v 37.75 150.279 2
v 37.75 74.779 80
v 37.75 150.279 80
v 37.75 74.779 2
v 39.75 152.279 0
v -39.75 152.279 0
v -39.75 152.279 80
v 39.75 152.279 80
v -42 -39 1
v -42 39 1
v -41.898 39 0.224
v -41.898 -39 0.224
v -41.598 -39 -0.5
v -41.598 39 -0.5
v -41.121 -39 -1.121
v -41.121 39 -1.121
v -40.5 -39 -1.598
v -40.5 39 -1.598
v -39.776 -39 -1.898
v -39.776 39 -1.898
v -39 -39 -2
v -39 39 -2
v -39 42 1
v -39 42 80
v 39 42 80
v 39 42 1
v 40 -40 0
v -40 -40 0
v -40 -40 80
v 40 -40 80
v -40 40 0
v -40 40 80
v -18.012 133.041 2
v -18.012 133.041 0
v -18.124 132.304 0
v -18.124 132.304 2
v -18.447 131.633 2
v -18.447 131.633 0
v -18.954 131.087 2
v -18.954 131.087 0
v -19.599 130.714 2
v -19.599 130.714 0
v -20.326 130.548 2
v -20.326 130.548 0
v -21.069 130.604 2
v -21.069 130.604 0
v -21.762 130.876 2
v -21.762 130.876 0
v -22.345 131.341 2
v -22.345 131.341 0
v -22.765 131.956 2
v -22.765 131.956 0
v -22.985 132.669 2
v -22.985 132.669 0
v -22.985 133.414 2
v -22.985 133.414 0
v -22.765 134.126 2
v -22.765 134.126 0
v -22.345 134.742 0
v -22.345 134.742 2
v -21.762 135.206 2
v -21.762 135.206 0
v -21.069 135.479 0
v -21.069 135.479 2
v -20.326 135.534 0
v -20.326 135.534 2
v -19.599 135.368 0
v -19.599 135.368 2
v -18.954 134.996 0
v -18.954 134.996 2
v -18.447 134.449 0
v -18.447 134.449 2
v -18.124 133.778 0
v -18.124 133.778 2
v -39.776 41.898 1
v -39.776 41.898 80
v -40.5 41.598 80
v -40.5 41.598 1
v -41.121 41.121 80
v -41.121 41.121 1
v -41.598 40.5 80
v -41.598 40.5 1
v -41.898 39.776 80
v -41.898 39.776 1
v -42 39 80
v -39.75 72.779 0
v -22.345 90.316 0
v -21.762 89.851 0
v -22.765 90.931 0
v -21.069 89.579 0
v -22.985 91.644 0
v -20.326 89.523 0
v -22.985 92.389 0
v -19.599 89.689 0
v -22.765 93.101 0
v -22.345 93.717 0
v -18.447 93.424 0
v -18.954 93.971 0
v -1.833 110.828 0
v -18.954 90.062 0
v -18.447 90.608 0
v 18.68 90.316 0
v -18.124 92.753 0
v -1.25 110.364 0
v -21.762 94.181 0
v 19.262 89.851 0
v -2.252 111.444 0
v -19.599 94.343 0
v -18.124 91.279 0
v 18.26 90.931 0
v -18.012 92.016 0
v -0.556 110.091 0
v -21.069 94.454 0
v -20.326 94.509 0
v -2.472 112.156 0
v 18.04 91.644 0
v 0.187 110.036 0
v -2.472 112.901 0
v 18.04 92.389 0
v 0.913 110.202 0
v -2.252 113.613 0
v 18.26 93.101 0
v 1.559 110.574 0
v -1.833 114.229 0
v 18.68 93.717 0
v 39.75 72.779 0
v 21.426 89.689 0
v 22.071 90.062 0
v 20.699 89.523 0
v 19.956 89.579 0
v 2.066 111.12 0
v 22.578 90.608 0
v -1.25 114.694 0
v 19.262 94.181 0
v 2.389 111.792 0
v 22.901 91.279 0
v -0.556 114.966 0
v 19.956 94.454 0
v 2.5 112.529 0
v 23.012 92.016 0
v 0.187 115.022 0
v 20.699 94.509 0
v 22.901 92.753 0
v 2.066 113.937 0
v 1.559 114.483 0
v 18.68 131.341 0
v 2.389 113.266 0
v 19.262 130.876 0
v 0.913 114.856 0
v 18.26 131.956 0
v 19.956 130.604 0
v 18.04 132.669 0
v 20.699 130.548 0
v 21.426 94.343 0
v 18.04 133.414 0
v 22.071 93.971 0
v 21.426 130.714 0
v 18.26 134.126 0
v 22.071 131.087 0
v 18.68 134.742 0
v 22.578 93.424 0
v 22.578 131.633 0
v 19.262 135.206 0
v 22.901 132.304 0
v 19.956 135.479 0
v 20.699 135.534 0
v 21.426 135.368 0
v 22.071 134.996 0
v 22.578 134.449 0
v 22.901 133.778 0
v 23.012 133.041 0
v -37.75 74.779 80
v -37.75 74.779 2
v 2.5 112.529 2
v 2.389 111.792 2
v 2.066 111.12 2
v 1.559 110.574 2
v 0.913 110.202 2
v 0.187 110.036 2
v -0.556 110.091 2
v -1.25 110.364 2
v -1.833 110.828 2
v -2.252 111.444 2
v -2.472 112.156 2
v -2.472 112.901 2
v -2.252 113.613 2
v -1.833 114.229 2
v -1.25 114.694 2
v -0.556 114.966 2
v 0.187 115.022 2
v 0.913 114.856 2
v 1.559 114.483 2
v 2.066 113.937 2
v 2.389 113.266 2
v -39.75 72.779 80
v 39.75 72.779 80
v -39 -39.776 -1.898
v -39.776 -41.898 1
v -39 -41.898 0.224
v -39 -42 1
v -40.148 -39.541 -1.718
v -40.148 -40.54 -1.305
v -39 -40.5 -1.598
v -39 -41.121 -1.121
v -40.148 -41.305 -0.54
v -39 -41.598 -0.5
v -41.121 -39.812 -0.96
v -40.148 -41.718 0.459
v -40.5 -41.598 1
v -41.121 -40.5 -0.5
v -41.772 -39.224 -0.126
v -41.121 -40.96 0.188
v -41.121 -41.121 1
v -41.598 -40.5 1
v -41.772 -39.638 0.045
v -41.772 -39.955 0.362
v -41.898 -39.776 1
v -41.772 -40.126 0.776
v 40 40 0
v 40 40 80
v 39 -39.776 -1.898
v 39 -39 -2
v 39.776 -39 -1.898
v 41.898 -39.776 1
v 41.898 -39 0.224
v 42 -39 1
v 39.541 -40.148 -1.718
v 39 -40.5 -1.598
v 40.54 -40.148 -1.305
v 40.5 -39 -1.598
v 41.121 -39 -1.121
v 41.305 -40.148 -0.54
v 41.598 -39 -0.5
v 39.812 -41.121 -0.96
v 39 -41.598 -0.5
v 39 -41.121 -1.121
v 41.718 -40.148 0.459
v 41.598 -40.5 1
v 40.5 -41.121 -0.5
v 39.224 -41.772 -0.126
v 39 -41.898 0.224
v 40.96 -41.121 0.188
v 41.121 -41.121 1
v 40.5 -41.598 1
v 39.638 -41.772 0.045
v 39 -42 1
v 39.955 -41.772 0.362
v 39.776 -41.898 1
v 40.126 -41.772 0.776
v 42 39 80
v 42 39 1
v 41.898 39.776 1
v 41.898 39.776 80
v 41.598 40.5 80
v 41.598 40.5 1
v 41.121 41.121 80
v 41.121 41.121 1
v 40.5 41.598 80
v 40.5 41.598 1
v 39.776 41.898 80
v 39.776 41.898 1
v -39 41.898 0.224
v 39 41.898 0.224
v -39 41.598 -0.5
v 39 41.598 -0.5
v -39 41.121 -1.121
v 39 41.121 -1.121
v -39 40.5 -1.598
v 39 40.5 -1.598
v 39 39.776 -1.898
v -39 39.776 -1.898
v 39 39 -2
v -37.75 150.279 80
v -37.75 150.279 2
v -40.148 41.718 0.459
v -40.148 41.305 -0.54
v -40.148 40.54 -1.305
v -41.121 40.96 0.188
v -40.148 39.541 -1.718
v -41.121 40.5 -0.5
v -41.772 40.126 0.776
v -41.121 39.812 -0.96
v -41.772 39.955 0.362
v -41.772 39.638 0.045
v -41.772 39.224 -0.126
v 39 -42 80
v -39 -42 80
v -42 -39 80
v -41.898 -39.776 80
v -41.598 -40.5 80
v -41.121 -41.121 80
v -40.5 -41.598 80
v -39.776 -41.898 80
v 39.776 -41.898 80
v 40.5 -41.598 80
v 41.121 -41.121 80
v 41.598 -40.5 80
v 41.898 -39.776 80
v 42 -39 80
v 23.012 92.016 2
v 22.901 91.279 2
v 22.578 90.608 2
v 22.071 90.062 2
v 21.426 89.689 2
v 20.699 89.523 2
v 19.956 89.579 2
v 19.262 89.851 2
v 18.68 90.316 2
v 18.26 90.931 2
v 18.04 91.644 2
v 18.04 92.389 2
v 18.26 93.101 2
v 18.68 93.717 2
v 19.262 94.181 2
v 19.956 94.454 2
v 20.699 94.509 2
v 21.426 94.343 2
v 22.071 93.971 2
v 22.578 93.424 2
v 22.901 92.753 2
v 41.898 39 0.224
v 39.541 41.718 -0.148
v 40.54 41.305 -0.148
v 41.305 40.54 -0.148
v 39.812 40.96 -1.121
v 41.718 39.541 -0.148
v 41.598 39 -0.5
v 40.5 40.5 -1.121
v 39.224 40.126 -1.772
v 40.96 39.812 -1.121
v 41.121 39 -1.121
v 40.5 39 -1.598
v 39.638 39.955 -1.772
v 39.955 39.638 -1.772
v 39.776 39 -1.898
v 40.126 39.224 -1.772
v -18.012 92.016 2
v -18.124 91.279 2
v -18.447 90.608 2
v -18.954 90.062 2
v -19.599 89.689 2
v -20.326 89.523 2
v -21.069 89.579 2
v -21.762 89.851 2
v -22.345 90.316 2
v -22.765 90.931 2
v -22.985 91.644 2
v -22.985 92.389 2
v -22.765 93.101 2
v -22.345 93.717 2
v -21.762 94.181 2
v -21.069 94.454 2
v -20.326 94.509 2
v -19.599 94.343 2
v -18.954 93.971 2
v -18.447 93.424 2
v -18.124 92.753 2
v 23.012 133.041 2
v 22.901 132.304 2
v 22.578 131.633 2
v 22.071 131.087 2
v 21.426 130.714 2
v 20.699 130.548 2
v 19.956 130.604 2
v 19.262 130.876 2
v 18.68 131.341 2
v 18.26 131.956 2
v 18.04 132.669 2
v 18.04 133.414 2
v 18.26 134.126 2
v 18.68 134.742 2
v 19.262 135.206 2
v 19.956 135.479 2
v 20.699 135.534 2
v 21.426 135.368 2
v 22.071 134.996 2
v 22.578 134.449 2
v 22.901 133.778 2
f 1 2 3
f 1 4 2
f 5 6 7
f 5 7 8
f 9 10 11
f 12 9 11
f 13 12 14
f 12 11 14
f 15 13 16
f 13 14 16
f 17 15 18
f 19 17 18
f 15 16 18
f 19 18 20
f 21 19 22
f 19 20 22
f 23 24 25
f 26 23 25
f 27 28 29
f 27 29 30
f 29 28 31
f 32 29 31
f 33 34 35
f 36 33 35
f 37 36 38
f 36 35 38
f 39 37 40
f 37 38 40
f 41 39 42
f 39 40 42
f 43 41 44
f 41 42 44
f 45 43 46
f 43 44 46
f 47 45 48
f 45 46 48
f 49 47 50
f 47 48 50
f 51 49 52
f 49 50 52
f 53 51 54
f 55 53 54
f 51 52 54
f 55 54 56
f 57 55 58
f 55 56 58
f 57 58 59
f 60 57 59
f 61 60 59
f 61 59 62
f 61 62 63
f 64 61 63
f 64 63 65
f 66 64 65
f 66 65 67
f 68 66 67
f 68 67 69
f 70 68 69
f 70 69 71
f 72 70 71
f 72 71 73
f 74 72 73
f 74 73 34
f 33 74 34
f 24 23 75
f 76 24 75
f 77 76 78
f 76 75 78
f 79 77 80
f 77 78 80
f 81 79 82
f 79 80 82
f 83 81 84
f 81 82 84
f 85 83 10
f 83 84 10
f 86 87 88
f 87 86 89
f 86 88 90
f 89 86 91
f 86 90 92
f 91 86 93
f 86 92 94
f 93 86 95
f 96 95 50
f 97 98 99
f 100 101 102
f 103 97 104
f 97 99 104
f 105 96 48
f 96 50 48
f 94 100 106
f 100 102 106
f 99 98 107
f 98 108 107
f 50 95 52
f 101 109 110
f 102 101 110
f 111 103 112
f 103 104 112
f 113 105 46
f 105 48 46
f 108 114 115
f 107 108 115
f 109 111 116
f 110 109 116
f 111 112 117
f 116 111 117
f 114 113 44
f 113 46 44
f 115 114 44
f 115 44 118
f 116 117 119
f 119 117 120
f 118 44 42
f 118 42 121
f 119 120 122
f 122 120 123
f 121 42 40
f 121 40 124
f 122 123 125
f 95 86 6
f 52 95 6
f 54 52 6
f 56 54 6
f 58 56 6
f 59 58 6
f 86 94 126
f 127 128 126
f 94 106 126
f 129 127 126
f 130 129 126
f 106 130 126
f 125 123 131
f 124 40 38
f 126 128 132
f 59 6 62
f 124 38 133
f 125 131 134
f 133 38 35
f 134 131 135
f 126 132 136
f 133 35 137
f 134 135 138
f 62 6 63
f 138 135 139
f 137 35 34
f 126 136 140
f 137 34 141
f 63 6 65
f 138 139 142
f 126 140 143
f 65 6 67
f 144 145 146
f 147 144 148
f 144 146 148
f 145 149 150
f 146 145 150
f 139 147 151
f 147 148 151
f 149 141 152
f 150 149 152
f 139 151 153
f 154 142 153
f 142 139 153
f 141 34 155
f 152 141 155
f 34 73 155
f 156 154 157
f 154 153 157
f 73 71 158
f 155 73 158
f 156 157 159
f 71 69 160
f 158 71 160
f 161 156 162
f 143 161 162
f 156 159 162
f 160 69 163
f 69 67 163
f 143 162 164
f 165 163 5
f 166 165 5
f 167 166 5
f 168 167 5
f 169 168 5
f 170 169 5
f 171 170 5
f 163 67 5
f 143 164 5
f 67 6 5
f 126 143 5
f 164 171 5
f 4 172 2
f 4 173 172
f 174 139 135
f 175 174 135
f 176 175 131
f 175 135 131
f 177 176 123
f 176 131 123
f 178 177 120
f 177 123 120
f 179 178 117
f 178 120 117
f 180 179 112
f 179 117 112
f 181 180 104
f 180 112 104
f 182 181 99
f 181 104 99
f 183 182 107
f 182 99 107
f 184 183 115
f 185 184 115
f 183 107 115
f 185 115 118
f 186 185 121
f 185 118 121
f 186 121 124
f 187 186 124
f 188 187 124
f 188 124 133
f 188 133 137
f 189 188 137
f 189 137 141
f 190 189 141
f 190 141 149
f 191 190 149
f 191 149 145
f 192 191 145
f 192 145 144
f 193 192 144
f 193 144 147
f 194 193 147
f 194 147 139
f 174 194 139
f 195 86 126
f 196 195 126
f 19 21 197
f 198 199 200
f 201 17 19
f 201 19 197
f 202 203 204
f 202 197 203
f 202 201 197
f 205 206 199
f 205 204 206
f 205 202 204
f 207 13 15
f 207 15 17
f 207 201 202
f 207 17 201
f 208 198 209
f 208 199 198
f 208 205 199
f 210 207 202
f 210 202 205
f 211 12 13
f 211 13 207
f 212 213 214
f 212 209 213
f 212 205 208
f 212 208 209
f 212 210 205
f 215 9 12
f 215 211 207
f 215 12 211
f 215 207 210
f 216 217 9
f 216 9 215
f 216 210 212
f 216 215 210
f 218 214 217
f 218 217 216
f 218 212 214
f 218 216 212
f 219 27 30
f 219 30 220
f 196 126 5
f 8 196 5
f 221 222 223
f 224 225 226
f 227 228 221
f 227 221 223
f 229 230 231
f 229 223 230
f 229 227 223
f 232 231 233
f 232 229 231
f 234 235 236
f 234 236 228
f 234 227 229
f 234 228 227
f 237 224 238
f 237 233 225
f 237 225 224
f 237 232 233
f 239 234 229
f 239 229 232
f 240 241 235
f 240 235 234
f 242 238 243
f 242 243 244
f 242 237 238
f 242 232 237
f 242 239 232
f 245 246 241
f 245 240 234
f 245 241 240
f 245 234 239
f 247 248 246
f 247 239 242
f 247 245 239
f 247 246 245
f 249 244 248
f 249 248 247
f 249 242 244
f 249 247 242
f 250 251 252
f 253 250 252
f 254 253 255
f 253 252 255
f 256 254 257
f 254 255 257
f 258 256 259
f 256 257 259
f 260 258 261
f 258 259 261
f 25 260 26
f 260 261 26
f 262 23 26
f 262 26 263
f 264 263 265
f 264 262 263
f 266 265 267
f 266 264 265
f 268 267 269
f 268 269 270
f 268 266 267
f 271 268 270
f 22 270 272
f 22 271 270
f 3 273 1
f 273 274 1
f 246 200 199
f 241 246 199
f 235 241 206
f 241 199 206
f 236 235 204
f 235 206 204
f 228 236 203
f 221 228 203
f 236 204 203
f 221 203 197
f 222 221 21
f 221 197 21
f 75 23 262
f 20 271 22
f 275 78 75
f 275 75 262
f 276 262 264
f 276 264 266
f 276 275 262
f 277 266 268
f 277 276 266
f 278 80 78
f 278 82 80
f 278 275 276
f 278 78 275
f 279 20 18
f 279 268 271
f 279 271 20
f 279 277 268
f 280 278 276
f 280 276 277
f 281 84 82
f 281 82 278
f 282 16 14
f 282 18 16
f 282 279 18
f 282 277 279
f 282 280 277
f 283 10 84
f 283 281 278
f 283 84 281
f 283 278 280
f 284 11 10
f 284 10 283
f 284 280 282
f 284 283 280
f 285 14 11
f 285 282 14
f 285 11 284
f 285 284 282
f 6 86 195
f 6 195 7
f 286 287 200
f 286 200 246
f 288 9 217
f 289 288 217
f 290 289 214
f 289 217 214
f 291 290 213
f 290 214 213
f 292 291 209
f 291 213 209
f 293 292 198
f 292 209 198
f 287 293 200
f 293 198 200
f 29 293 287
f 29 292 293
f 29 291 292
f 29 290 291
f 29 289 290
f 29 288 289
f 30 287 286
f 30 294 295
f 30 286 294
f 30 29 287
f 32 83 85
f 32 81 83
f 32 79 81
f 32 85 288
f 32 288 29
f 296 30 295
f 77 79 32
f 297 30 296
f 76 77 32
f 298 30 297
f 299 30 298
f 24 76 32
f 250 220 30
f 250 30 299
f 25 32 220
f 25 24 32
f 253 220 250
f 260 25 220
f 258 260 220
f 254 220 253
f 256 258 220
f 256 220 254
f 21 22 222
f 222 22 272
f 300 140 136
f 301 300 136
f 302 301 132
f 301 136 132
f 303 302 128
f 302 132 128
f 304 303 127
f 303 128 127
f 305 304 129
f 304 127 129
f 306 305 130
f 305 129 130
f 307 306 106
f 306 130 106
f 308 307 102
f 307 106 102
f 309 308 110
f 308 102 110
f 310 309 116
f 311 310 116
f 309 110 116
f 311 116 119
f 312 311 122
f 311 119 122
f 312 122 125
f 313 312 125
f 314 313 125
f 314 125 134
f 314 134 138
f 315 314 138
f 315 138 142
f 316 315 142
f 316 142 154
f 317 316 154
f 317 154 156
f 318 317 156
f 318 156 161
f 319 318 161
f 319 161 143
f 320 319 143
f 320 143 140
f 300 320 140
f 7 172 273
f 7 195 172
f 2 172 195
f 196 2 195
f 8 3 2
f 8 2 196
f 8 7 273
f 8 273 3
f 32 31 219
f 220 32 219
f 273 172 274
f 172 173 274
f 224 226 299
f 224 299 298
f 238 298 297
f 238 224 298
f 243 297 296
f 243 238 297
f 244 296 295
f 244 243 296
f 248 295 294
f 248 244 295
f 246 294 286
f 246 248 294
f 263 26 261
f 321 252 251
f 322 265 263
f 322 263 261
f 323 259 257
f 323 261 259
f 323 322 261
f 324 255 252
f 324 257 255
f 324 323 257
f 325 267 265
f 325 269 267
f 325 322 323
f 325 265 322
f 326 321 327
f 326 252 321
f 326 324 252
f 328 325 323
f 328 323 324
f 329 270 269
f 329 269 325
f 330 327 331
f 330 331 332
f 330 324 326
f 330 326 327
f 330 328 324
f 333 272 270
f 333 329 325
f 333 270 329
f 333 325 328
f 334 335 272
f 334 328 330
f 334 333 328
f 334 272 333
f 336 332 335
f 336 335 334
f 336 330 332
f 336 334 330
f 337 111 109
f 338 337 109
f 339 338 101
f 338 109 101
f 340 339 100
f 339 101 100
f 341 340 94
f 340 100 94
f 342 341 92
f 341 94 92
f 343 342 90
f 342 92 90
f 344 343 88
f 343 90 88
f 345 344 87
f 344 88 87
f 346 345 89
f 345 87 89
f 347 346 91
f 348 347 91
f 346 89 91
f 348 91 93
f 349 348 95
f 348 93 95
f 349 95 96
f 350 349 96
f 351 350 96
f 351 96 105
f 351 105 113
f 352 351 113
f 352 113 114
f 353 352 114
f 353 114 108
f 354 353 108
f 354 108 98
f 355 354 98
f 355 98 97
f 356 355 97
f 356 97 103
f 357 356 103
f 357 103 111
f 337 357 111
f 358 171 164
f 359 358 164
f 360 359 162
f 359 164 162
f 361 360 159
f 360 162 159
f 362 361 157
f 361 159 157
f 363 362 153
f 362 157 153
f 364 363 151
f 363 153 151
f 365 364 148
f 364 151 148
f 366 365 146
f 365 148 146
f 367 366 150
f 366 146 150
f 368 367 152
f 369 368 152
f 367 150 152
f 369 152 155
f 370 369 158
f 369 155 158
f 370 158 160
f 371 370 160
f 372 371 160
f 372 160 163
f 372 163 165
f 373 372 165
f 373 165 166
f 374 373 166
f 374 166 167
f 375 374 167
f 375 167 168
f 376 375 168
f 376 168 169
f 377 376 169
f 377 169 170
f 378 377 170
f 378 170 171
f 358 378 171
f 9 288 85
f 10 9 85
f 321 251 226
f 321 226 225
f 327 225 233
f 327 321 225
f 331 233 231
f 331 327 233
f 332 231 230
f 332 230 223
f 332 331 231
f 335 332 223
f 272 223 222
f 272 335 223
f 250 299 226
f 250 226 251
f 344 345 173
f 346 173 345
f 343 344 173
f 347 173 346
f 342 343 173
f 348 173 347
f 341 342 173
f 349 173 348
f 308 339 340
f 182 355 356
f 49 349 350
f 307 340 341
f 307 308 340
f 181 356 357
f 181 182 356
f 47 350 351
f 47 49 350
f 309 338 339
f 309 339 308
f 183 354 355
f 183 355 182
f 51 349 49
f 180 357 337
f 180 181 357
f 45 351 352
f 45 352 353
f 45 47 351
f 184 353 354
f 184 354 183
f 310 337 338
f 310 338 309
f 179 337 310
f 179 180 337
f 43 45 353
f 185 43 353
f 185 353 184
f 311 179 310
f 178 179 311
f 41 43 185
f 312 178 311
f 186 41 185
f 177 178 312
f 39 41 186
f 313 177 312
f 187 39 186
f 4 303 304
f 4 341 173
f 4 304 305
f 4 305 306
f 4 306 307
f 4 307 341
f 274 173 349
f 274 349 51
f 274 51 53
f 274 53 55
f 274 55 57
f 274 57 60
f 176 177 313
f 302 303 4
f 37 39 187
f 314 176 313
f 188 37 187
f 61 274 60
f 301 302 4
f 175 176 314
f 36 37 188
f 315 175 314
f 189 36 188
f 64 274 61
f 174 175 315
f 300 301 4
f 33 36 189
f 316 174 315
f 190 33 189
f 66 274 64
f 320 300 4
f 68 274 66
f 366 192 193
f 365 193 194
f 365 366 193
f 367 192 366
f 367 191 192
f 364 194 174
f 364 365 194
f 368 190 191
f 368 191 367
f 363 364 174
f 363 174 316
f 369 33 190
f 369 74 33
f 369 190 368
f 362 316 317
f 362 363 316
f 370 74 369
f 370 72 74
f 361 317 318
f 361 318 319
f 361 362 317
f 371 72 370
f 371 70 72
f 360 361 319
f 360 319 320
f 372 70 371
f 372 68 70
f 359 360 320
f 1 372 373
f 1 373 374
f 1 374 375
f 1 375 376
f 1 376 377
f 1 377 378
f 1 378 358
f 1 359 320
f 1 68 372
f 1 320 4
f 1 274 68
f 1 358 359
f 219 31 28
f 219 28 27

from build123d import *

# Parameters (mm, degrees)
F0_W         = 80
F0_H         = 80
F1_DEPTH     = 80
F2_T         = 2
F3_W         = 79.5
F3_H         = 79.5
F4_DEPTH     = 80
F5_T         = -2
F6_T1_DEPTH  = 86.5
F6_T3_DEPTH  = 78
F6_T5_DEPTH  = 78
F6_S9_W      = 3
F6_S9_H      = 3
F6_T10_DEPTH = 3
F6_S15_W     = 3
F6_S15_H     = 3
F6_T16_DEPTH = 3
F6_S21_W     = 3
F6_S21_H     = 3
F6_T22_DEPTH = 3
F6_S27_W     = 3
F6_S27_H     = 3
F6_T28_DEPTH = 3
F8_R         = 2.5
F9_DEPTH     = 2.05


# Not quite as in the source:
# - a fillet or chamfer that OpenCascade refuses, or shapes differently, is made with other operations: its cross-section is extruded or revolved along the edge and cut away or added
# - a feature of the source that left no trace in its solid (it failed there, or was rolled back) is left out


with BuildPart() as f1:
    # F0 (on Top) → F1 (new body)
    with BuildSketch(Plane.XY):
        Rectangle(F0_W, F0_H)
    extrude(amount=F1_DEPTH)

    # F2
    f2_openings = [f1.faces().sort_by_distance(p)[0] for p in [
        (0, 0, 80),
    ]]
    offset(amount=F2_T, openings=f2_openings, kind=Kind.INTERSECTION)

    # F6: fillet of radius 3 on 8 edges, made by hand

    # F6_s2 → F6_t1 (cut)
    with BuildSketch(Plane.XY.offset(1)):
        with BuildLine():
            ThreePointArc((42, -39), (41.1213203436, -41.1213203436), (39, -42))
            Line((39, -42), (42, -42))
            Line((42, -42), (42, -39))
        make_face()
        with BuildLine():
            ThreePointArc((42, 39), (41.1213203436, 41.1213203436), (39, 42))
            Line((39, 42), (42, 42))
            Line((42, 42), (42, 39))
        make_face()
        with BuildLine():
            ThreePointArc((-39, 42), (-41.1213203436, 41.1213203436), (-42, 39))
            Line((-42, 39), (-42, 42))
            Line((-42, 42), (-39, 42))
        make_face()
        with BuildLine():
            ThreePointArc((-42, -39), (-41.1213203436, -41.1213203436), (-39, -42))
            Line((-39, -42), (-42, -42))
            Line((-42, -42), (-42, -39))
        make_face()
    extrude(amount=F6_T1_DEPTH, mode=Mode.SUBTRACT)

    # F6_s4 → F6_t3 (cut)
    with BuildSketch(Plane.XZ.offset(-39)):
        with BuildLine():
            ThreePointArc((42, 1), (41.1213203436, -1.1213203436), (39, -2))
            Line((39, -2), (42, -2))
            Line((42, -2), (42, 1))
        make_face()
        with BuildLine():
            ThreePointArc((-42, 1), (-41.1213203436, -1.1213203436), (-39, -2))
            Line((-39, -2), (-42, -2))
            Line((-42, -2), (-42, 1))
        make_face()
    extrude(amount=F6_T3_DEPTH, mode=Mode.SUBTRACT)

    # F6_s6 → F6_t5 (cut)
    with BuildSketch(Plane.YZ.offset(-39)):
        with BuildLine():
            ThreePointArc((42, 1), (41.1213203436, -1.1213203436), (39, -2))
            Line((39, -2), (42, -2))
            Line((42, -2), (42, 1))
        make_face()
        with BuildLine():
            ThreePointArc((-42, 1), (-41.1213203436, -1.1213203436), (-39, -2))
            Line((-39, -2), (-42, -2))
            Line((-42, -2), (-42, 1))
        make_face()
    extrude(amount=F6_T5_DEPTH, mode=Mode.SUBTRACT)


with BuildPart() as f4:
    # F3 (on Top) → F4 (new body)
    with BuildSketch(Plane.XY):
        with Locations((0, 112.5286910326)):
            Rectangle(F3_W, F3_H)
    extrude(amount=F4_DEPTH)

    # F5
    f5_openings = [f4.faces().sort_by_distance(p)[0] for p in [
        (0, 112.528691, 80),
    ]]
    offset(amount=F5_T, openings=f5_openings)

    # F8 (on face) → F9 (cut)
    with BuildSketch(Plane(origin=(0, 0, 0), x_dir=(1, 0, 0), z_dir=(0, 0, -1))):
        with Locations((20.5125, -133.0411910326)):
            Circle(F8_R)
        with Locations((-20.5125, -133.0411910326)):
            Circle(F8_R)
        with Locations((-20.5125, -92.0161910326)):
            Circle(F8_R)
        with Locations((0, -112.5286910326)):
            Circle(F8_R)
        with Locations((20.5125, -92.0161910326)):
            Circle(F8_R)
    extrude(amount=-F9_DEPTH, mode=Mode.SUBTRACT)


with BuildPart() as f6_tool8:
    # F6_s9 → F6_t10 (new body)
    with BuildSketch(Plane.XZ.offset(39)):
        with Locations((40.5, -0.5)):
            Rectangle(F6_S9_W, F6_S9_H)
    extrude(amount=F6_T10_DEPTH)

    # F6_s11 → F6_t12 (revolve, cut)
    with BuildSketch(Plane(origin=(39, -39, 1), x_dir=(-0.7071067812, 0, 0.7071067812), z_dir=(0.7071067812, 0, 0.7071067812))):
        with BuildLine():
            ThreePointArc((0, -3), (3, 0), (0, 3))
            Line((0, 3), (0, -3))
        make_face()
    revolve(axis=Axis((39, -39, 1), (0, -1, 0)), mode=Mode.SUBTRACT)


with BuildPart() as f1_1:
    add(f1.part)

    # F6_t7: cut F6_tool8
    add(f6_tool8.part, mode=Mode.SUBTRACT)


with BuildPart() as f6_tool14:
    # F6_s15 → F6_t16 (new body)
    with BuildSketch(Plane.XY.offset(1)):
        with Locations((40.5, 40.5)):
            Rectangle(F6_S15_W, F6_S15_H)
    extrude(amount=-F6_T16_DEPTH)

    # F6_s17 → F6_t18 (revolve, cut)
    with BuildSketch(Plane(origin=(39, 39, 1), x_dir=(-0.7071067812, -0.7071067812, 0), z_dir=(0.7071067812, -0.7071067812, 0))):
        with BuildLine():
            ThreePointArc((0, -3), (3, 0), (0, 3))
            Line((0, 3), (0, -3))
        make_face()
    revolve(axis=Axis((39, 39, 1), (0, 0, -1)), mode=Mode.SUBTRACT)


with BuildPart() as f1_2:
    add(f1_1.part)

    # F6_t13: cut F6_tool14
    add(f6_tool14.part, mode=Mode.SUBTRACT)


with BuildPart() as f6_tool20:
    # F6_s21 → F6_t22 (new body)
    with BuildSketch(Plane.YZ.offset(-39)):
        with Locations((40.5, -0.5)):
            Rectangle(F6_S21_W, F6_S21_H)
    extrude(amount=-F6_T22_DEPTH)

    # F6_s23 → F6_t24 (revolve, cut)
    with BuildSketch(Plane(origin=(-39, 39, 1), x_dir=(0, -0.7071067812, 0.7071067812), z_dir=(0, -0.7071067812, -0.7071067812))):
        with BuildLine():
            ThreePointArc((0, -3), (3, 0), (0, 3))
            Line((0, 3), (0, -3))
        make_face()
    revolve(axis=Axis((-39, 39, 1), (-1, 0, 0)), mode=Mode.SUBTRACT)


with BuildPart() as f1_3:
    add(f1_2.part)

    # F6_t19: cut F6_tool20
    add(f6_tool20.part, mode=Mode.SUBTRACT)


with BuildPart() as f6_tool26:
    # F6_s27 → F6_t28 (new body)
    with BuildSketch(Plane.YZ.offset(-39)):
        with Locations((-40.5, -0.5)):
            Rectangle(F6_S27_W, F6_S27_H)
    extrude(amount=-F6_T28_DEPTH)

    # F6_s29 → F6_t30 (revolve, cut)
    with BuildSketch(Plane(origin=(-39, -39, 1), x_dir=(0, 0.7071067812, 0.7071067812), z_dir=(0, -0.7071067812, 0.7071067812))):
        with BuildLine():
            ThreePointArc((0, -3), (3, 0), (0, 3))
            Line((0, 3), (0, -3))
        make_face()
    revolve(axis=Axis((-39, -39, 1), (-1, 0, 0)), mode=Mode.SUBTRACT)


with BuildPart() as f1_4:
    add(f1_3.part)

    # F6_t25: cut F6_tool26
    add(f6_tool26.part, mode=Mode.SUBTRACT)


solid = Compound([f4.part, f1_4.part])
